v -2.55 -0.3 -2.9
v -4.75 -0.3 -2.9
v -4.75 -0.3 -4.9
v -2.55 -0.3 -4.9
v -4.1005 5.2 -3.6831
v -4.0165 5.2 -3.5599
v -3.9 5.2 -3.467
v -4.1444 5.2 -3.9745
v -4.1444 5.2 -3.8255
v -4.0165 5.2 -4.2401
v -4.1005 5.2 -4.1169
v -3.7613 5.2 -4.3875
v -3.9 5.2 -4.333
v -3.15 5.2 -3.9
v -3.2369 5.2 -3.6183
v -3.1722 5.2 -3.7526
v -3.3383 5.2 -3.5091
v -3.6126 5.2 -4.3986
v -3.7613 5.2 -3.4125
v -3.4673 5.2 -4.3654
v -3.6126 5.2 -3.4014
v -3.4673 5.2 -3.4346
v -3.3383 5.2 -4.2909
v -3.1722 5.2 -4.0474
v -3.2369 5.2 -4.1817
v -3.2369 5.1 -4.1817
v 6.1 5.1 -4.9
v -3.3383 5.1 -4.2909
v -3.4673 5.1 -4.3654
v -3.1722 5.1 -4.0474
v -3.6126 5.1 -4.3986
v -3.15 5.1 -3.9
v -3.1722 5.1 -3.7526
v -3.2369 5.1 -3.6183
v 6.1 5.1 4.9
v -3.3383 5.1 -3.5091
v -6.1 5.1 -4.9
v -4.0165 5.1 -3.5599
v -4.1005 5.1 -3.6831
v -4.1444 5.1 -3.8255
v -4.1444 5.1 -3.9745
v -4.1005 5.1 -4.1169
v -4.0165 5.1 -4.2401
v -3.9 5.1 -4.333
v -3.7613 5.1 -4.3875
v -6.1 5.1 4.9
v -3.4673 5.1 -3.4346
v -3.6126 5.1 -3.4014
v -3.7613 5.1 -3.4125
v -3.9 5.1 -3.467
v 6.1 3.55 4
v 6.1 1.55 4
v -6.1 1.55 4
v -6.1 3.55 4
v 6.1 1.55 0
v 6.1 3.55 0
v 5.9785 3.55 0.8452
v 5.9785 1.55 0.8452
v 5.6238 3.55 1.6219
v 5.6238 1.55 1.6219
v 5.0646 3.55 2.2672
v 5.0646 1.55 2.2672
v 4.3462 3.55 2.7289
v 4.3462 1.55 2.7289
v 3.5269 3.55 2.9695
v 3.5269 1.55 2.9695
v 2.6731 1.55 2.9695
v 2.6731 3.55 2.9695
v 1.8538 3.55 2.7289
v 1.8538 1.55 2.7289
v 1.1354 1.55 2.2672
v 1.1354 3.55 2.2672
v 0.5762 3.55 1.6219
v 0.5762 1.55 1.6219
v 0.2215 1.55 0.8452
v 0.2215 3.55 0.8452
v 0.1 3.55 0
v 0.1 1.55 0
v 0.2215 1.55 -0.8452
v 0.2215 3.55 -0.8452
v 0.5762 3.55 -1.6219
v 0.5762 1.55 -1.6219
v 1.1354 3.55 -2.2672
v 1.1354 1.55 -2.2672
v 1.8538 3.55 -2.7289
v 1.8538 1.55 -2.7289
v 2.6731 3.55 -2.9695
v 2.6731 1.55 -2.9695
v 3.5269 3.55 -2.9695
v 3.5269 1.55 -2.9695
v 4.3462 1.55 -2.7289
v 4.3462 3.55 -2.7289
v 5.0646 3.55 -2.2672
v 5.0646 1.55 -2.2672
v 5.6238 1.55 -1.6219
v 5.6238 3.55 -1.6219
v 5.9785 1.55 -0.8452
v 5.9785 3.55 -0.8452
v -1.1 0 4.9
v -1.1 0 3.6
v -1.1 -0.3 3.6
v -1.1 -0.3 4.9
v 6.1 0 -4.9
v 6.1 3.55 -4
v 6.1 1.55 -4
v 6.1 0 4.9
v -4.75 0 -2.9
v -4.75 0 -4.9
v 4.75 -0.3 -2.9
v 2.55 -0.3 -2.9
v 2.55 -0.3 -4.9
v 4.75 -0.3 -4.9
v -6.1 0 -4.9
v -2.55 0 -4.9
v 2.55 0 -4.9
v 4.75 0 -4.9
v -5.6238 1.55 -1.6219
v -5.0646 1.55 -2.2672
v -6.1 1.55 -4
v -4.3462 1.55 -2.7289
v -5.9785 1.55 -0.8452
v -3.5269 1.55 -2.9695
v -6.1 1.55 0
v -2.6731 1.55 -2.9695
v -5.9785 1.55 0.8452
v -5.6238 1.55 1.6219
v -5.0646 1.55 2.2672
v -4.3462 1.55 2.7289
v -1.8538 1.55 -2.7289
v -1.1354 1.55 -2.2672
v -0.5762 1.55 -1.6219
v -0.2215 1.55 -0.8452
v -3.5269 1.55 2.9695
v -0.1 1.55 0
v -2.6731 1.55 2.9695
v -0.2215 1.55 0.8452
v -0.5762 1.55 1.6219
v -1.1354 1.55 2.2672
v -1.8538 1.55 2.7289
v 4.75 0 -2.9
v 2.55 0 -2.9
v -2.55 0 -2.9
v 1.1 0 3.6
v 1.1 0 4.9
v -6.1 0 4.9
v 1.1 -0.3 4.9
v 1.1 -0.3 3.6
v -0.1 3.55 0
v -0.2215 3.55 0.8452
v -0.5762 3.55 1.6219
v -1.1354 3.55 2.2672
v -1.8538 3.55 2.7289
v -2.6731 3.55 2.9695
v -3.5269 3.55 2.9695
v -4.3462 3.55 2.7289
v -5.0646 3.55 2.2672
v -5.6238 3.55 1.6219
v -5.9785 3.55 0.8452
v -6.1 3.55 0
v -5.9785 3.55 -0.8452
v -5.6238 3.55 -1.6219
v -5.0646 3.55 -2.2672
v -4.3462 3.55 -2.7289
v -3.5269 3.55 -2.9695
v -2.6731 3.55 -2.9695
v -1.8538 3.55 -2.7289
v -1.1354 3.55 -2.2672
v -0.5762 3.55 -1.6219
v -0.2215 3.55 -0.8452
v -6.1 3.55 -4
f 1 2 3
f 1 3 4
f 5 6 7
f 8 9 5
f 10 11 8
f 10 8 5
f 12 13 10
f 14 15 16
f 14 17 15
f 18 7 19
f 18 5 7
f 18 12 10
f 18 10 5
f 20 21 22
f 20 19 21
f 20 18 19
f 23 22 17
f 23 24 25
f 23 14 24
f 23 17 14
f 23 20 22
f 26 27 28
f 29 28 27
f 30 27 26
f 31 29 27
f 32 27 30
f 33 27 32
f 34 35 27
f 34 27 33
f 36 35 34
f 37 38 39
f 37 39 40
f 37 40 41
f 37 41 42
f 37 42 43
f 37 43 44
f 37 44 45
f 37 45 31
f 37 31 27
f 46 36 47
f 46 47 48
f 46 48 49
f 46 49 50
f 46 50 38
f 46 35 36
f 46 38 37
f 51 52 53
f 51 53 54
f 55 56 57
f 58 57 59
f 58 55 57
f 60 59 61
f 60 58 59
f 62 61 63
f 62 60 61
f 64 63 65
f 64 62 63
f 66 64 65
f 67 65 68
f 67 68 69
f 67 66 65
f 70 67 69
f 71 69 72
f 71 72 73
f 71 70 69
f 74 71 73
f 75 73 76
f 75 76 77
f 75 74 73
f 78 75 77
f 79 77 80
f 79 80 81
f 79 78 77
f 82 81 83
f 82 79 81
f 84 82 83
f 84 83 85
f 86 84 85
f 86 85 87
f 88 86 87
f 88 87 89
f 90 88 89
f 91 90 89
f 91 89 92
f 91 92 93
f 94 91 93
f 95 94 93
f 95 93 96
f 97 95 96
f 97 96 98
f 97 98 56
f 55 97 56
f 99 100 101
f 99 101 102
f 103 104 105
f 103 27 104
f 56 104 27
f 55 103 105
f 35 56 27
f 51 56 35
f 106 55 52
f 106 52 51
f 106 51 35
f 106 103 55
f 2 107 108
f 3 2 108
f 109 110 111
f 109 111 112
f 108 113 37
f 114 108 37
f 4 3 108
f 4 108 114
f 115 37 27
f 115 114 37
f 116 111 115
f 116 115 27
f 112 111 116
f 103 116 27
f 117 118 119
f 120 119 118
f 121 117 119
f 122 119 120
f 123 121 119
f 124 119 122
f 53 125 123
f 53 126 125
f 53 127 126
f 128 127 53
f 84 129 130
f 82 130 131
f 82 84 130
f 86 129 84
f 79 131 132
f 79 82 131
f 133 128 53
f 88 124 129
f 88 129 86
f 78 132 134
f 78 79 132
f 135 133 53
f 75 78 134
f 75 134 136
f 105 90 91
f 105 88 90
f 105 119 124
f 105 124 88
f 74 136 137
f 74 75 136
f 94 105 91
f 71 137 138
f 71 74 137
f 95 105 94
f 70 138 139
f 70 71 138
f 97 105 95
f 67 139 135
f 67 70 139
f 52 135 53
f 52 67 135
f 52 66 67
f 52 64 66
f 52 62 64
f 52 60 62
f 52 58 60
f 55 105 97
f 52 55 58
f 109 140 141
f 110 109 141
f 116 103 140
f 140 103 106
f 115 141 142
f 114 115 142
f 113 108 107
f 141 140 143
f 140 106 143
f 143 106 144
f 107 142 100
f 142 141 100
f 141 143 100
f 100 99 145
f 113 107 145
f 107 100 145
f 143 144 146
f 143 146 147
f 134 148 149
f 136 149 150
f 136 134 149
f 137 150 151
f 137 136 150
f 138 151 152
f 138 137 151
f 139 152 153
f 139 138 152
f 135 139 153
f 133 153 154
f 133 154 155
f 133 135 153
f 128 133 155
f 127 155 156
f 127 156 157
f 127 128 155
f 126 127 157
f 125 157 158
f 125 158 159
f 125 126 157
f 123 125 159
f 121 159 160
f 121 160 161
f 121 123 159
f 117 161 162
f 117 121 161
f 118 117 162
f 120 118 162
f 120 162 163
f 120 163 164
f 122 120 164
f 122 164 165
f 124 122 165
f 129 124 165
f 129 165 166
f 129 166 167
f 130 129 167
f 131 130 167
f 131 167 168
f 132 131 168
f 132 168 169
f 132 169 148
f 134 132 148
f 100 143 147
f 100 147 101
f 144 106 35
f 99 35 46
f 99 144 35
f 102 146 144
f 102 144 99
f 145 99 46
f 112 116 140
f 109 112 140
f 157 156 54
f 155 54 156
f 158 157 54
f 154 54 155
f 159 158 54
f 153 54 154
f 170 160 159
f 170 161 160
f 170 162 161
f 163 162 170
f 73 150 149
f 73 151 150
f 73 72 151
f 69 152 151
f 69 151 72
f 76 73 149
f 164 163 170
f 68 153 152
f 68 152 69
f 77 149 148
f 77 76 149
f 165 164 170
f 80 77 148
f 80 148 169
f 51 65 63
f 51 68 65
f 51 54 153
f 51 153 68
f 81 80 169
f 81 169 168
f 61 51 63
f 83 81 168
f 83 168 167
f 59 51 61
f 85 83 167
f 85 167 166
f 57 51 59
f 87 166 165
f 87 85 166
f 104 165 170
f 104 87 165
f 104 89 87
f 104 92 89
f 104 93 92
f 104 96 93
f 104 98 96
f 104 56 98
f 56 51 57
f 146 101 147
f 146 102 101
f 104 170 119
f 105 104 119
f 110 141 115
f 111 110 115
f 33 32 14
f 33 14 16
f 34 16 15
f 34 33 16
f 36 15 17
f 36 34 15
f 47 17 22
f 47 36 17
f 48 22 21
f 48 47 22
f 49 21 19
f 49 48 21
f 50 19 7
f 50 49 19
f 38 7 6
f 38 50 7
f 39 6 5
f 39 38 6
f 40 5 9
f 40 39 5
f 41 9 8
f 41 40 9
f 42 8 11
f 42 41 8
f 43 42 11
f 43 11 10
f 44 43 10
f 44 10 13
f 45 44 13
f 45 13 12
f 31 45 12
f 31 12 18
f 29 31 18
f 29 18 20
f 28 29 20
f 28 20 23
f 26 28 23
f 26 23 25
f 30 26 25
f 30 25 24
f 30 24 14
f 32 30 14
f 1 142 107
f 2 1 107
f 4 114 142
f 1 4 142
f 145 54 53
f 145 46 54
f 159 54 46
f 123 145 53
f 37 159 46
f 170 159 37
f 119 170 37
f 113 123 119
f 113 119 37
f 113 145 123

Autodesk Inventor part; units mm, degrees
ref_plane "YZ Plane" through (0, 0, 0) normal (1, 0, 0) x (0, 1, 0)
ref_plane "XZ Plane" through (0, 0, 0) normal (0, 1, 0) x (-1, 0, 0)
ref_plane "XY Plane" through (0, 0, 0) normal (0, 0, 1) x (1, 0, 0)
sketch "Sketch1" plane through (0, 0, 0) normal (0, 1, 0) x (-1, 0, 0)
  line L0 (-6.1, 4.9) -> (6.1, 4.9)
  line L1 (6.1, 4.9) -> (6.1, -4.9)
  line L2 (6.1, -4.9) -> (-6.1, -4.9)
  line L3 (-6.1, -4.9) -> (-6.1, 4.9)
  line L4 (-6.1, 4.9) -> (6.1, -4.9) construction
  line L5 (6.1, 4.9) -> (-6.1, -4.9) construction
  point P0 (0, 0)
  dimension "d0" = 12.2
  dimension "d1" = 9.8
extrude "Extrusion1" add sketch "Sketch1" along normal blind 5.1
sketch "Sketch2" plane through (6.1, 0, 4.9) normal (1, 0, 0) x (0, 0, -1)
  line L0 (4.9, 0) -> (4.9, 2.55)
  line L1 (0, 0) -> (0, 5.1) projected
  line L2 (8.9, 1.55) -> (0.9, 1.55)
  line L3 (0.9, 1.55) -> (0.9, 3.55)
  line L4 (0.9, 3.55) -> (8.9, 3.55)
  line L5 (8.9, 3.55) -> (8.9, 1.55)
  line L6 (8.9, 1.55) -> (0.9, 3.55) construction
  line L7 (0.9, 1.55) -> (8.9, 3.55) construction
  dimension "d4" = 2.55
  dimension "d5" = 8
  dimension "d6" = 2
extrude "Extrusion2" cut sketch "Sketch2" against normal up to next
sketch "Sketch3" plane through (6.1, 1.55, 4) normal (0, 1, 0) x (1, 0, 0)
  line L0 (-12.2, 8.9) -> (-12.2, -0.9) projected
  line L1 (-12.2, 4) -> (-9.2, 4)
  line L2 (0, 0) -> (0, 8) projected
  line L3 (0, 4) -> (-3, 4)
  circle A0 centre (-3, 4) radius 3
  circle A1 centre (-9.2, 4) radius 3
  point P0 (-6.1, 4)
  dimension "d9" = 3
  dimension "d10" = 3
  dimension "d11" = 6
  dimension "d12" = 6
extrude "Extrusion3" add sketch "Sketch3" along normal up to next
sketch "Sketch4" plane through (0, 0, 0) normal (0, -1, 0) x (1, 0, 0)
  line L0 (6.1, 4.9) -> (-6.1, 4.9) projected
  line L1 (0, 4.9) -> (0, 4.25)
  line L2 (1.1, 3.6) -> (-1.1, 3.6)
  line L3 (-1.1, 3.6) -> (-1.1, 4.9)
  line L4 (-1.1, 4.9) -> (1.1, 4.9)
  line L5 (1.1, 4.9) -> (1.1, 3.6)
  line L6 (1.1, 3.6) -> (-1.1, 4.9) construction
  line L7 (-1.1, 3.6) -> (1.1, 4.9) construction
  line L8 (6.1, -4.9) -> (-6.1, -4.9) projected
  line L9 (-6.1, -4.9) -> (-4.75, -4.9)
  line L10 (-4.75, -4.9) -> (-3.65, -4.9)
  line L11 (-3.65, -4.9) -> (-3.65, -3.9)
  line L12 (-3.65, -4.9) -> (-2.65, -4.9) construction
  line L13 (-2.55, -2.9) -> (-4.75, -2.9)
  line L14 (-4.75, -2.9) -> (-4.75, -4.9)
  line L15 (-4.75, -4.9) -> (-2.55, -4.9)
  line L16 (-2.55, -4.9) -> (-2.55, -2.9)
  line L17 (-2.55, -2.9) -> (-4.75, -4.9) construction
  line L18 (-4.75, -2.9) -> (-2.55, -4.9) construction
  line L19 (4.75, -2.9) -> (2.55, -2.9)
  line L20 (4.75, -4.9) -> (4.75, -2.9)
  line L21 (3.65, -4.9) -> (4.65, -4.9) construction
  line L22 (2.55, -2.9) -> (2.55, -4.9)
  line L23 (2.55, -4.9) -> (4.75, -4.9)
  point P0 (0, 0)
  dimension "d15" = 0.65
  dimension "d16" = 2.2
  dimension "d17" = 1.3
  dimension "d18" = 1.35
  dimension "d19" = 1.1
  dimension "d20" = 1
  dimension "d21" = 90
  dimension "d22" = 2.2
  dimension "d23" = 2
  dimension "d26" = 7.3
extrude "Extrusion4" add sketch "Sketch4" along normal blind 0.3
sketch "Sketch5" plane through (0, 5.1, 0) normal (0, 1, 0) x (1, 0, 0)
  line L0 (6.1, 4.9) -> (-6.1, 4.9) projected
  line L1 (-6.1, 4.9) -> (-3.65, 4.9)
  line L2 (-3.65, 4.9) -> (-3.65, 3.9)
  circle A0 centre (-3.65, 3.9) radius 0.5
  point P0 (0, 0)
  dimension "d33" = 2.45
  dimension "d34" = 1
  dimension "d35" = 1
extrude "Extrusion5" add sketch "Sketch5" along normal blind 0.1
sketch "Sketch6" plane through (0, 5.1, 0) normal (0, 1, 0) x (1, 0, 0)
  line L0 (-4.0529, 1.1605) -> (0.3424, 1.1605) construction
  line L1 (0.3424, 1.1605) -> (0.3424, 0.2782) construction
  line L2 (0.3424, 0.2782) -> (-4.0529, 0.2782) construction
  line L3 (-4.0529, 0.2782) -> (-4.0529, 1.1605) construction
  point P0 (0, 0)
  dimension "d1" = 9.8
properties part number "HCV1206"
